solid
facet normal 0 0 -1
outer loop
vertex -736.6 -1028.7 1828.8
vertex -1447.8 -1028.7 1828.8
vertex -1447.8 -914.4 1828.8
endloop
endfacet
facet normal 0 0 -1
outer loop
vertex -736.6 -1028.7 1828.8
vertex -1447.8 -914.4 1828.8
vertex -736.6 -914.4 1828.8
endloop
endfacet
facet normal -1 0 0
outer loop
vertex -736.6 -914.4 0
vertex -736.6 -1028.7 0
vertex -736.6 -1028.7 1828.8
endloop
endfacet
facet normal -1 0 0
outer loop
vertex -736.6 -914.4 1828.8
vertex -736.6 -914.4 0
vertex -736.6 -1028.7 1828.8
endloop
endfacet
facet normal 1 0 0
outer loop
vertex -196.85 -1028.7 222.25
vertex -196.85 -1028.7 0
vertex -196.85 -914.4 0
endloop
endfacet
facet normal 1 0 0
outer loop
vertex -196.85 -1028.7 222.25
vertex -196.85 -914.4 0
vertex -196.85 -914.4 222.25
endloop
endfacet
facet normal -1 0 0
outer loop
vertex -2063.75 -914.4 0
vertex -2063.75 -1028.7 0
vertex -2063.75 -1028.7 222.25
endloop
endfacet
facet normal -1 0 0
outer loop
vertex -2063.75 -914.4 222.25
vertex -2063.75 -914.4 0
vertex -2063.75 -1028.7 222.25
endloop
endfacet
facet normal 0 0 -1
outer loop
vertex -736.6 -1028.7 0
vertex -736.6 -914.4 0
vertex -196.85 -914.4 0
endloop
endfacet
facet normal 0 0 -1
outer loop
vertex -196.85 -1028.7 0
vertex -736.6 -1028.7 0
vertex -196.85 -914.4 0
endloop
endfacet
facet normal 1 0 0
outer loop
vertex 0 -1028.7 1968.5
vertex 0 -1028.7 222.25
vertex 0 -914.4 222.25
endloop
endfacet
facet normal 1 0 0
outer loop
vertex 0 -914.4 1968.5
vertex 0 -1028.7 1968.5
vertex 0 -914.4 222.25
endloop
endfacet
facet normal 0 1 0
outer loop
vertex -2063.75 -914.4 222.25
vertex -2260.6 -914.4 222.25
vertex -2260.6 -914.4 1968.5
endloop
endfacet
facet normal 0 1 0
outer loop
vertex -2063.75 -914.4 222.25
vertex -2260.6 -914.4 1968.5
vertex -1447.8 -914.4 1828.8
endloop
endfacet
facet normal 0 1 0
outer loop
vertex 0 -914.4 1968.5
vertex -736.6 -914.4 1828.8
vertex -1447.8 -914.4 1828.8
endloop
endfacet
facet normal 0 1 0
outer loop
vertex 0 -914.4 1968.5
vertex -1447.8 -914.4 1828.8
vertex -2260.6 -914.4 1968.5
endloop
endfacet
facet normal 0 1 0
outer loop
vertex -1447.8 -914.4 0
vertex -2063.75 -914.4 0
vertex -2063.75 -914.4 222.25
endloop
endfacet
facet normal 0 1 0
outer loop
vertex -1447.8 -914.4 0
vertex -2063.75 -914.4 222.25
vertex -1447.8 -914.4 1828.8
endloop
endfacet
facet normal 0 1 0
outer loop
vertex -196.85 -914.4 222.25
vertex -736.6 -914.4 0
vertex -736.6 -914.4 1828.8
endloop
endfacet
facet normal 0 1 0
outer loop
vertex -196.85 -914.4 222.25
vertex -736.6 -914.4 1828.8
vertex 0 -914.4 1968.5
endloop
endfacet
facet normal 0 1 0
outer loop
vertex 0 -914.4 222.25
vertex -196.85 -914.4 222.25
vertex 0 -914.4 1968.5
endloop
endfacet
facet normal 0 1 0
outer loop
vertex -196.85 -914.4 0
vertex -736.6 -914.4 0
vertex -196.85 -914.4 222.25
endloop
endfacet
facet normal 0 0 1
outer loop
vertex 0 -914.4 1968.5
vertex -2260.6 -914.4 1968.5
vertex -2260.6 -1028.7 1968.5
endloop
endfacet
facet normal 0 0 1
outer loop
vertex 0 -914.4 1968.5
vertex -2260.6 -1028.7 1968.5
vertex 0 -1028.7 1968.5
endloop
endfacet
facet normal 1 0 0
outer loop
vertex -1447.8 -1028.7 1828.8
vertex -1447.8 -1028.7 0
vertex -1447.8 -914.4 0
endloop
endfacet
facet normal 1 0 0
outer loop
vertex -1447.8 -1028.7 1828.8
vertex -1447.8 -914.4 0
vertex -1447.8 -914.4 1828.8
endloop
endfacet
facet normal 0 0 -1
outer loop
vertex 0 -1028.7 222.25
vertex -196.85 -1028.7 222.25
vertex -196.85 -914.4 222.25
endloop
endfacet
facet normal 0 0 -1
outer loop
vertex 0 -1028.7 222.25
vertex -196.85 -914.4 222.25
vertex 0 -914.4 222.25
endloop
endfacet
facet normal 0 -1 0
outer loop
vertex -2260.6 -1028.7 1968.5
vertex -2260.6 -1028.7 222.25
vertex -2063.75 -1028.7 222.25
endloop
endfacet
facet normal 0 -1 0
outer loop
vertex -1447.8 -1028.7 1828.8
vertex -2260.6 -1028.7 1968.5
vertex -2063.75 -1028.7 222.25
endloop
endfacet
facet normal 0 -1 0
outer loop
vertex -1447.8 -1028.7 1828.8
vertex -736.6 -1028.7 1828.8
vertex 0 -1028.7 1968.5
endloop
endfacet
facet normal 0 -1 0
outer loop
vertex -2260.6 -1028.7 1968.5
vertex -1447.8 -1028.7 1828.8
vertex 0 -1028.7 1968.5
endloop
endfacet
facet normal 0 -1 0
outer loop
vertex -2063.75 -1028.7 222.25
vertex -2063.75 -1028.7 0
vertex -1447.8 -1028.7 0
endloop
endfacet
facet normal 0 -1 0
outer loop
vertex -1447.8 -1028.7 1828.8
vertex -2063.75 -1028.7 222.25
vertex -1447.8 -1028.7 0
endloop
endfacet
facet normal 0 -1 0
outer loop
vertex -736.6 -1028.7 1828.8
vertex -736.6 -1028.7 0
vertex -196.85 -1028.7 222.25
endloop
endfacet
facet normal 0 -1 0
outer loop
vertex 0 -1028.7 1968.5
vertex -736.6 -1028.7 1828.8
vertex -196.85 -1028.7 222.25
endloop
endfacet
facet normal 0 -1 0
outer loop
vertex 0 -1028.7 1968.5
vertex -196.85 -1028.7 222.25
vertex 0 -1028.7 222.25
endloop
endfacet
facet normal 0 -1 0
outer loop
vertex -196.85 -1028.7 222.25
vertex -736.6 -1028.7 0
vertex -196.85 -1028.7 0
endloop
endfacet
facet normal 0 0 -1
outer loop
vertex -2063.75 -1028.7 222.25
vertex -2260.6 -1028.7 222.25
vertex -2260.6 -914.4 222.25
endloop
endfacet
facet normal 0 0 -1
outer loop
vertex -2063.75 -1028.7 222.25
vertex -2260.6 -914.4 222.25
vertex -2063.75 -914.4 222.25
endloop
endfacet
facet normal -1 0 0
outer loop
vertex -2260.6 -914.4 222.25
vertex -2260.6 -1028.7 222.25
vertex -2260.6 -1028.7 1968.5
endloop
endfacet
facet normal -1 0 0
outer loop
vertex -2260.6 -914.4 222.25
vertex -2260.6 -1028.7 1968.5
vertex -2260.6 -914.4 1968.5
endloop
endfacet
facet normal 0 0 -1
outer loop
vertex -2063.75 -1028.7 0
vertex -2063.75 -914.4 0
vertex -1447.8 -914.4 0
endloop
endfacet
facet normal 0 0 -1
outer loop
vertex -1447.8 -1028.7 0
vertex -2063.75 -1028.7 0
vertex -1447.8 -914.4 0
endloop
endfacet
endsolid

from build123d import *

# Parameters (mm, degrees)
F0_W     = 2260.6
F0_H     = 114.3
F1_DEPTH = 1968.5
F2_W     = 711.2
F2_H     = 1828.8
F3_DEPTH = 114.301
F4_W     = 196.85
F4_H     = 222.25
F5_DEPTH = 114.301


with BuildPart() as f1:
    # F0 (on Top) → F1 (new body)
    with BuildSketch(Plane.XY):
        with Locations((-1130.3, -971.55)):
            Rectangle(F0_W, F0_H)
    extrude(amount=F1_DEPTH)

    # F2 (on face) → F3 (cut, through all)
    with BuildSketch(Plane.XZ.offset(1028.7)):
        with Locations((-1092.2, 914.4)):
            Rectangle(F2_W, F2_H)
    extrude(amount=-F3_DEPTH, mode=Mode.SUBTRACT)

    # F4 (on face) → F5 (cut, through all)
    with BuildSketch(Plane.XZ.offset(1028.7)):
        with Locations((-2162.175, 111.125)):
            Rectangle(F4_W, F4_H)
        with Locations((-98.425, 111.125)):
            Rectangle(F4_W, F4_H)
    extrude(amount=-F5_DEPTH, mode=Mode.SUBTRACT)


solid = f1.part
